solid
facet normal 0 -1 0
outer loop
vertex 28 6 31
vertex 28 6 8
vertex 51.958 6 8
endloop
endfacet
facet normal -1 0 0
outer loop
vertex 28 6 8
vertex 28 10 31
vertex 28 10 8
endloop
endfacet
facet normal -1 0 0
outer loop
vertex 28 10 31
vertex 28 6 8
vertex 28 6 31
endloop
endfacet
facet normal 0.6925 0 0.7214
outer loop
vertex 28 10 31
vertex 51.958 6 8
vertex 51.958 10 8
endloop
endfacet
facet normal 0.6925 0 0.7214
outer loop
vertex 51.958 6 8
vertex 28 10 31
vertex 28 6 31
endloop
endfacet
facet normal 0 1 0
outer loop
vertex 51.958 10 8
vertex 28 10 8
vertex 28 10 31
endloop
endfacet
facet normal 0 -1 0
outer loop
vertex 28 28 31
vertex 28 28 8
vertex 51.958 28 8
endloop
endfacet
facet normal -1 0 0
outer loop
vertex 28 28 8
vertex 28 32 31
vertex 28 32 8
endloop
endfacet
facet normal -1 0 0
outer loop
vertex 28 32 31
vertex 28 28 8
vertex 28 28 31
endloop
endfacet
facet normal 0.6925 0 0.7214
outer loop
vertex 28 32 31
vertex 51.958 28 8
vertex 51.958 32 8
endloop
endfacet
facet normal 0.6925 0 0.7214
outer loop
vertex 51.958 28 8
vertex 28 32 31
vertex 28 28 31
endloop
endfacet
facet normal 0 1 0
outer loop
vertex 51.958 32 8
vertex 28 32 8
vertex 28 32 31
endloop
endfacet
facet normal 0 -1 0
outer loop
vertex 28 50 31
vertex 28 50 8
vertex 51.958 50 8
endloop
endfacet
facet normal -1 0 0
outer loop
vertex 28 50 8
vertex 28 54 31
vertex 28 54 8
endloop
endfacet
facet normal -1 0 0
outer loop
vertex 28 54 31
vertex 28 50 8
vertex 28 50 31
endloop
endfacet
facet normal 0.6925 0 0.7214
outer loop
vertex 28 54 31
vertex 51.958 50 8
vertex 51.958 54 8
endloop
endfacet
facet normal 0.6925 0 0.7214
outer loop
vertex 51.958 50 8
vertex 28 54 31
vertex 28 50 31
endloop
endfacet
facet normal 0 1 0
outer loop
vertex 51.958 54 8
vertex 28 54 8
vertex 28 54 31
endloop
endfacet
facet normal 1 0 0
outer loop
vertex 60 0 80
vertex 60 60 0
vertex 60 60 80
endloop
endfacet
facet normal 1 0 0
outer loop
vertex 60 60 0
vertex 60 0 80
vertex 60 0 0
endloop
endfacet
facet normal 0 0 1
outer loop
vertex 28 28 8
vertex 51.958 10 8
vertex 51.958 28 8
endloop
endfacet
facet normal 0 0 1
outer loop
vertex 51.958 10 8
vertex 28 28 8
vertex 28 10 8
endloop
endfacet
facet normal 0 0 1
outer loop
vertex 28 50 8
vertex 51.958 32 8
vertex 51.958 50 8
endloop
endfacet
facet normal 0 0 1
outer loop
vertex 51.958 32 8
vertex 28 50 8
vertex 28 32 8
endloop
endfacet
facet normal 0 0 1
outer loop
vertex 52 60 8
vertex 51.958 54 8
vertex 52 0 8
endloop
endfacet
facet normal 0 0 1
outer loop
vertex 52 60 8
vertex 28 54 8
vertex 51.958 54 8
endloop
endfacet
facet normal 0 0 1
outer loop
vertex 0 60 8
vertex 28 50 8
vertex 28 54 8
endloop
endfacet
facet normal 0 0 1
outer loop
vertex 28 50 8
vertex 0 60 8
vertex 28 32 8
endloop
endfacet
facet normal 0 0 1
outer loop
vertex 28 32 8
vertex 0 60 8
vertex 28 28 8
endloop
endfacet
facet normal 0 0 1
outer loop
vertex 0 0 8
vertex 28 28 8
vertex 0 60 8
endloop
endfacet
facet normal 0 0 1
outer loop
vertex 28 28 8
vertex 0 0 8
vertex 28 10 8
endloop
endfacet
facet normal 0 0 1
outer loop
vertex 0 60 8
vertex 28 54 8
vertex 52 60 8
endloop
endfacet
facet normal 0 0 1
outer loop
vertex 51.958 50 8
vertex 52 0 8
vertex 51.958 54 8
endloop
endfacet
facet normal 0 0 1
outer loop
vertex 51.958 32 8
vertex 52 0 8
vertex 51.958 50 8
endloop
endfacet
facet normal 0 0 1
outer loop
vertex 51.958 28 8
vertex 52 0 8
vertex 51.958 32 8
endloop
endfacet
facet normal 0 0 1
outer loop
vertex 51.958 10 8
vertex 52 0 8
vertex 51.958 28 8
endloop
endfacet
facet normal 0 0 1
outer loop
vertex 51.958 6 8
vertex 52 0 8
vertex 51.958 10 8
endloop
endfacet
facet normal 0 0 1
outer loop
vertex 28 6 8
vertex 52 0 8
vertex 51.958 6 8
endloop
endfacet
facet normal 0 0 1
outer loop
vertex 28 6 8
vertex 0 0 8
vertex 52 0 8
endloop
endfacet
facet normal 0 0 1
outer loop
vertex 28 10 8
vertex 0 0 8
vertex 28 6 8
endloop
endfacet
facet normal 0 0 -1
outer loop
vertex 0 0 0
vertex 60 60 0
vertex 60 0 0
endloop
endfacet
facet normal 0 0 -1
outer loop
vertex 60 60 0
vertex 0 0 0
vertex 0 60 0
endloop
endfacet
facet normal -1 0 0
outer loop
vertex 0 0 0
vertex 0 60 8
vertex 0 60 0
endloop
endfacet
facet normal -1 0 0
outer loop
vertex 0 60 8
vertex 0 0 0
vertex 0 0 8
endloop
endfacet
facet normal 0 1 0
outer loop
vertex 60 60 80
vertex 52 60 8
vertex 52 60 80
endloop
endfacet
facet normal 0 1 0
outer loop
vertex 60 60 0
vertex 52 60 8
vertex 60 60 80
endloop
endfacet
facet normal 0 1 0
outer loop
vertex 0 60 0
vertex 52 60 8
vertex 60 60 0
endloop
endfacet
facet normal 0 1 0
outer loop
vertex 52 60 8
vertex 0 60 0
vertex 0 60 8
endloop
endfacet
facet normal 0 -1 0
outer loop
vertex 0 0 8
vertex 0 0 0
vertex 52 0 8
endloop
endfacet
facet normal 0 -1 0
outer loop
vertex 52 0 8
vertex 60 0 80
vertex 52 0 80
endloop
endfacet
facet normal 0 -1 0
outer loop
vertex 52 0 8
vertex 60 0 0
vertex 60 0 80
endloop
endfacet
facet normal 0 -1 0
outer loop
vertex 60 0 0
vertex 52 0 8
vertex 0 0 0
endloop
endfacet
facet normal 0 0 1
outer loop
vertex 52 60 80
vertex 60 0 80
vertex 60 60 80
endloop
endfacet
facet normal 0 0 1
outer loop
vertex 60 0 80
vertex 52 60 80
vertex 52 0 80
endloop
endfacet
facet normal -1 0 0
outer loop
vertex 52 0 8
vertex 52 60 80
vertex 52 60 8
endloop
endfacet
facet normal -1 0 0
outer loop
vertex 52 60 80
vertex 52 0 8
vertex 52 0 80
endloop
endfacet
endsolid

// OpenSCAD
$fn = 32;

// ----------------------------------------------------------------------
// Rib bracket: 3-gusset L bracket
// ----------------------------------------------------------------------

// --- parameters (mm) ---
base_l = 60;              // foot length, X
base_w = 60;              // foot width, Y
base_t = 8;               // foot thickness
plate_t = 8;              // upright plate thickness
plate_h = 80;             // overall height
gus_l = 24;               // gusset leg along the foot
gus_h = 24;               // gusset height
gus_t = 4;                // gusset thickness
gus_edge = 6;             // gusset margin from the foot edge
n_gus = 3;                // gusset count

gus_pitch = (base_w - 2 * gus_edge - gus_t) / (n_gus - 1);  // gusset pitch

union() {
  cube([base_l, base_w, base_t]);
  translate([base_l - plate_t, 0, base_t - 1])
    cube([plate_t, base_w, plate_h - base_t + 1]);
  for (i = [0 : n_gus - 1])
    translate([base_l - plate_t - gus_l, gus_edge + i * gus_pitch, base_t - 1])
      rotate([-90, 0, 0])
        linear_extrude(height = gus_t)
          polygon(points = [[0, 0], [gus_l + 1, 0], [0, -gus_h]]);
}
